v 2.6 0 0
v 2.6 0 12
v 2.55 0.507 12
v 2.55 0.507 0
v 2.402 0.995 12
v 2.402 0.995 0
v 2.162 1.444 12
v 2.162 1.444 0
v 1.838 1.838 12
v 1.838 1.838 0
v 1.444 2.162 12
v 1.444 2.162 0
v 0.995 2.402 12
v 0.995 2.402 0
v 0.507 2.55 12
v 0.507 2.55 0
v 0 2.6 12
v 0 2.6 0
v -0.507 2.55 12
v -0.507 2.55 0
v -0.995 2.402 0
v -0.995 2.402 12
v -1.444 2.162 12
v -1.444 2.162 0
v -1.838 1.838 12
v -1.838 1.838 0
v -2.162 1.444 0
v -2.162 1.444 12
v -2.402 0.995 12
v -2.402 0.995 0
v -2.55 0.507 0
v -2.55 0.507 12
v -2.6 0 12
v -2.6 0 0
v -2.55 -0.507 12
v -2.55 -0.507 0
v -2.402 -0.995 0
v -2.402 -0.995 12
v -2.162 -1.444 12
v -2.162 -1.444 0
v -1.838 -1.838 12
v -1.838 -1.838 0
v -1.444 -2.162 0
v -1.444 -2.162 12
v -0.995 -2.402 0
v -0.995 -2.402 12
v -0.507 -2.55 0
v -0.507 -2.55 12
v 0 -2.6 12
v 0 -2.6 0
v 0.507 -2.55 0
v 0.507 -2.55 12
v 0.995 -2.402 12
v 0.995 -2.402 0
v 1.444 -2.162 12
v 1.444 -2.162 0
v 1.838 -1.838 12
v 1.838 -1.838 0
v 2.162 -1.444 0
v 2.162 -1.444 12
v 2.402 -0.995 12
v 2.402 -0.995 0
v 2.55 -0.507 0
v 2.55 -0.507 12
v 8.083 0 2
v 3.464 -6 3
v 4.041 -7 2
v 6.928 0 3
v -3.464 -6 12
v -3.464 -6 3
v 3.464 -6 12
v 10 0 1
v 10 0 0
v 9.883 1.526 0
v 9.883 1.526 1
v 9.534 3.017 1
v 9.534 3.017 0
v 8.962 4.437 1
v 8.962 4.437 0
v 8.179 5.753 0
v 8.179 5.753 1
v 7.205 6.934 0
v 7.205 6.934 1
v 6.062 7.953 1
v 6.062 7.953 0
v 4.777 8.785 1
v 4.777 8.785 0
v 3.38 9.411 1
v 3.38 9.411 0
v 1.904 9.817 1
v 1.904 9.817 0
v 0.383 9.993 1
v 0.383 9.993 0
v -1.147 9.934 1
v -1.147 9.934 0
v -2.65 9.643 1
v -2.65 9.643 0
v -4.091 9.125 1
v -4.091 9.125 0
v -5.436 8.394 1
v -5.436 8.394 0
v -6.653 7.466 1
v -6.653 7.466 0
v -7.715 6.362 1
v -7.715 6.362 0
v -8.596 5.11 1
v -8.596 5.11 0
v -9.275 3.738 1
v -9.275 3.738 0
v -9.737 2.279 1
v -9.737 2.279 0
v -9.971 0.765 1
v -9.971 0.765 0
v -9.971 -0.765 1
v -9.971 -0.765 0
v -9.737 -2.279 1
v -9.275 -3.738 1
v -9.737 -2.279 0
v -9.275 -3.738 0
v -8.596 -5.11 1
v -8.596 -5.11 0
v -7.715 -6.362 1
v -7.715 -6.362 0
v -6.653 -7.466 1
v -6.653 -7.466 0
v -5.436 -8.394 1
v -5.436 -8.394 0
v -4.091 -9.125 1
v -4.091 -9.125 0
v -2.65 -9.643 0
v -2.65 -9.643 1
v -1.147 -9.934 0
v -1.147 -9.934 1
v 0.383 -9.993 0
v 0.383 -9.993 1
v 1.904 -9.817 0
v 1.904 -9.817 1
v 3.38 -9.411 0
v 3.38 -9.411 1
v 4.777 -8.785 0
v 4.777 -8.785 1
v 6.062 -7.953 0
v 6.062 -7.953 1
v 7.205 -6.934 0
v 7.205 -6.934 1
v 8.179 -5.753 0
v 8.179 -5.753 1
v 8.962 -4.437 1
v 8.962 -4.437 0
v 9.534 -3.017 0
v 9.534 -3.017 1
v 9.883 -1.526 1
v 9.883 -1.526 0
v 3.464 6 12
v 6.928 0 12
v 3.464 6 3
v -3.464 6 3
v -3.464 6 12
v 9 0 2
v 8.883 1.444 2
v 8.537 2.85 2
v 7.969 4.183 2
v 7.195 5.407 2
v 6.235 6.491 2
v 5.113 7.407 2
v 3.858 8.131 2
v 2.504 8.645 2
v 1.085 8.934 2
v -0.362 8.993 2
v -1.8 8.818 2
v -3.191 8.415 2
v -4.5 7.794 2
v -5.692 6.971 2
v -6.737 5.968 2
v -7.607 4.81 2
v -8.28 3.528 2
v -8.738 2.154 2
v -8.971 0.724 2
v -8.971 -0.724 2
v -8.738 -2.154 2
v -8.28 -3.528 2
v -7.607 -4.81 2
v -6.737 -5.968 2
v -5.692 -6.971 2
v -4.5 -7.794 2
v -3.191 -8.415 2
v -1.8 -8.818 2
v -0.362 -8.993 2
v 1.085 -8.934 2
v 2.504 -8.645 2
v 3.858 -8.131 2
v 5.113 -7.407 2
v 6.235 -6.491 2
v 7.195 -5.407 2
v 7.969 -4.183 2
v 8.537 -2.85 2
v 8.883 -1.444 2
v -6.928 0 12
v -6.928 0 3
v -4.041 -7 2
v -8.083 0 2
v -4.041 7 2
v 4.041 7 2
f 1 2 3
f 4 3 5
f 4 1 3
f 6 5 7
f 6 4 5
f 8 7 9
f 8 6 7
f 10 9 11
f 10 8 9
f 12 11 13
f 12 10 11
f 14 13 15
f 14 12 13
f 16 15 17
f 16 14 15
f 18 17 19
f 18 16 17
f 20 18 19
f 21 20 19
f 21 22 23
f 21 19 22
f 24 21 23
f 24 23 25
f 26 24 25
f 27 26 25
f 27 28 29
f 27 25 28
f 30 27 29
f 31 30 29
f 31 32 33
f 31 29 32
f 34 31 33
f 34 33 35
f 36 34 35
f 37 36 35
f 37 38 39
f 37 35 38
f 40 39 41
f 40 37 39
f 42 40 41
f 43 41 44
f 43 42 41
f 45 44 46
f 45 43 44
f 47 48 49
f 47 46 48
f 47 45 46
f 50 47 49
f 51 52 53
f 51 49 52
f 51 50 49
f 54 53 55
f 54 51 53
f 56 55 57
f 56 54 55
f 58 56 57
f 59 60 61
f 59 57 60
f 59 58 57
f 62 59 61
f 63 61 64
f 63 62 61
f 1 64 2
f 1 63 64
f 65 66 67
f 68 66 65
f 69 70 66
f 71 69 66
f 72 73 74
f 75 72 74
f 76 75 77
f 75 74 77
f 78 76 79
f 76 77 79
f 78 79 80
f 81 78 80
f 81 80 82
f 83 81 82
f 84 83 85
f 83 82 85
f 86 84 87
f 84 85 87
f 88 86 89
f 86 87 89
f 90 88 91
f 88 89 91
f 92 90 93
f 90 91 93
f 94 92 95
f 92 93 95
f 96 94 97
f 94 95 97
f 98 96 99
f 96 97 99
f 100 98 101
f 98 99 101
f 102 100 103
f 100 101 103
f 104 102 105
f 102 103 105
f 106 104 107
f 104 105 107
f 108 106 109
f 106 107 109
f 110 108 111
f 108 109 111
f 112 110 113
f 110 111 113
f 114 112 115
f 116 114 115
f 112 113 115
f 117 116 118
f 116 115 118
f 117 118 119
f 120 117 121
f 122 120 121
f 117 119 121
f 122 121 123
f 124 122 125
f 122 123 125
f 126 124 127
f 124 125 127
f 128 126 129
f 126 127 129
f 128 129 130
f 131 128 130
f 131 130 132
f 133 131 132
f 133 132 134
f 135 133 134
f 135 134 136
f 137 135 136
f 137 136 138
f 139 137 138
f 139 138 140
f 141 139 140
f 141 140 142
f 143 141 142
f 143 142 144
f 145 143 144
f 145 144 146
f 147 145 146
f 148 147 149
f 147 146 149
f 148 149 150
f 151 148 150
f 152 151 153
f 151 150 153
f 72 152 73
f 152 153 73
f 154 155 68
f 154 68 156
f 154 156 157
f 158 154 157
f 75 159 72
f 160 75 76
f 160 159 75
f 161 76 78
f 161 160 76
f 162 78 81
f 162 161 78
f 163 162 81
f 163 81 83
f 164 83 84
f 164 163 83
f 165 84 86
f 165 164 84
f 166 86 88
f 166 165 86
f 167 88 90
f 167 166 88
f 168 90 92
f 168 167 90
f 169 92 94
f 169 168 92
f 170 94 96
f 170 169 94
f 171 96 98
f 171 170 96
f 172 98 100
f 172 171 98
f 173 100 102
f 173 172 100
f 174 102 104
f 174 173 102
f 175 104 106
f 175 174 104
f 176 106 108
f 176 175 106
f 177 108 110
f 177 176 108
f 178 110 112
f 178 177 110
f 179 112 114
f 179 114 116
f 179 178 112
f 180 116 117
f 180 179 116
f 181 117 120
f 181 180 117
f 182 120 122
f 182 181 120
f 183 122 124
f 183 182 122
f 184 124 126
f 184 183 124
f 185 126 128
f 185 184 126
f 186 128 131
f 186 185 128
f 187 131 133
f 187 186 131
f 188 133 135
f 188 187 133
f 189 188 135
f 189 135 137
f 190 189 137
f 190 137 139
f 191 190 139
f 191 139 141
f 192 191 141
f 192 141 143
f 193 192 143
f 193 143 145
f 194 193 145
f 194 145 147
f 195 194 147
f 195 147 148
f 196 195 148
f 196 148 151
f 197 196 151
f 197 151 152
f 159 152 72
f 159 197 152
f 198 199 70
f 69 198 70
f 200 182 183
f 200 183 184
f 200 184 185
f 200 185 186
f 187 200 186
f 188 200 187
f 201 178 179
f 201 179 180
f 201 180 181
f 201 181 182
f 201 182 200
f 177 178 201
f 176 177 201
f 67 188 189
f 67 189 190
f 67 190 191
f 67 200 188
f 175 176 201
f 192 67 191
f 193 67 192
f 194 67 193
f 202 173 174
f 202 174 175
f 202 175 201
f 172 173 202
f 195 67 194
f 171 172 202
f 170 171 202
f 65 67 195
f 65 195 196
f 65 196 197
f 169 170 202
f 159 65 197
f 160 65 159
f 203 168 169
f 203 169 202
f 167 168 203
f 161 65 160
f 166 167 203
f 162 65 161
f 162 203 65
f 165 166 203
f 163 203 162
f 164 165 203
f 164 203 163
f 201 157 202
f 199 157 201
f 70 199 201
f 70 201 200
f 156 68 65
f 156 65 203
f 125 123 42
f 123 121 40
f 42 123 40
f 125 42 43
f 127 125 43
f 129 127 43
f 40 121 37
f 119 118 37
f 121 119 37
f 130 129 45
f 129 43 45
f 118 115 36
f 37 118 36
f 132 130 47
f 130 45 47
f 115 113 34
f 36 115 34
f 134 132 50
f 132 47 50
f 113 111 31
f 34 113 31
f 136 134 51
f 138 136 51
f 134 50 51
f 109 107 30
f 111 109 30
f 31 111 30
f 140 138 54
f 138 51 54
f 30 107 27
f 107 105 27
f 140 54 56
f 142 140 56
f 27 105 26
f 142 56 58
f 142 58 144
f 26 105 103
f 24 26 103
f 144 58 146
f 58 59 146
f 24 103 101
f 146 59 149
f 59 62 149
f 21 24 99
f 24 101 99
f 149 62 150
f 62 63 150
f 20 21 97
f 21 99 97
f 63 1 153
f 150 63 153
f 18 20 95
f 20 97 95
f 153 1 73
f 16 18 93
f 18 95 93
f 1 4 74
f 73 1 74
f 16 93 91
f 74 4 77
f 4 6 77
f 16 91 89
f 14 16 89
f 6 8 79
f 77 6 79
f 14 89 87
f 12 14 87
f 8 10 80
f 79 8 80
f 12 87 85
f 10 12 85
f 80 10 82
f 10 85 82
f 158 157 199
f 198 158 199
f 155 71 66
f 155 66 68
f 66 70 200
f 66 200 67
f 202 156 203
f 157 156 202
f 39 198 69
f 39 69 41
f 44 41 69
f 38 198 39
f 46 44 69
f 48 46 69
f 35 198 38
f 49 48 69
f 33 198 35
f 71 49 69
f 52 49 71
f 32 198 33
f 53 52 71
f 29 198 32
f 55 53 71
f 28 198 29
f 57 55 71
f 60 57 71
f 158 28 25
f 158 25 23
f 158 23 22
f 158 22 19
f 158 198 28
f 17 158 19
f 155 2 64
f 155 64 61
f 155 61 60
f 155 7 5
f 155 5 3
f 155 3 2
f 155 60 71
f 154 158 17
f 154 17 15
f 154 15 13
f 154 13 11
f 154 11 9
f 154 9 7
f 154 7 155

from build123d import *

# Parameters (mm, degrees)
F1_DEPTH = 12
F2_R     = 10
F2_R_2   = 4.6
F3_DEPTH = 2
F2_R_3   = 2.6
F4_DEPTH = 12.001
F5_SIZE  = 1


with BuildPart() as f1:
    # F0 (on Top) → F1 (new body)
    with BuildSketch(Plane.XY):
        Polygon((3.464102, 6), (-3.464102, 6), (-6.928203, 0), (-3.464102, -6), (3.464102, -6), (6.928203, 0), align=None)
    extrude(amount=F1_DEPTH)

    # F2 (on Top) → F3 (join)
    with BuildSketch(Plane.XY):
        Circle(F2_R)
        Circle(F2_R_2, mode=Mode.SUBTRACT)
    extrude(amount=F3_DEPTH)

    # F2 (on Top) → F4 (cut, through all)
    with BuildSketch(Plane.XY):
        Circle(F2_R_3)
    extrude(amount=F4_DEPTH, mode=Mode.SUBTRACT)

    # F5
    f5_edges = [f1.edges().sort_by_distance(p)[0] for p in [
        (-10, 0, 2),
        (0, 6, 2),
        (-5.196152, 3, 2),
        (-5.196152, -3, 2),
        (0, -6, 2),
        (5.196152, -3, 2),
        (5.196152, 3, 2),
    ]]
    chamfer(f5_edges, length=F5_SIZE)


solid = f1.part
